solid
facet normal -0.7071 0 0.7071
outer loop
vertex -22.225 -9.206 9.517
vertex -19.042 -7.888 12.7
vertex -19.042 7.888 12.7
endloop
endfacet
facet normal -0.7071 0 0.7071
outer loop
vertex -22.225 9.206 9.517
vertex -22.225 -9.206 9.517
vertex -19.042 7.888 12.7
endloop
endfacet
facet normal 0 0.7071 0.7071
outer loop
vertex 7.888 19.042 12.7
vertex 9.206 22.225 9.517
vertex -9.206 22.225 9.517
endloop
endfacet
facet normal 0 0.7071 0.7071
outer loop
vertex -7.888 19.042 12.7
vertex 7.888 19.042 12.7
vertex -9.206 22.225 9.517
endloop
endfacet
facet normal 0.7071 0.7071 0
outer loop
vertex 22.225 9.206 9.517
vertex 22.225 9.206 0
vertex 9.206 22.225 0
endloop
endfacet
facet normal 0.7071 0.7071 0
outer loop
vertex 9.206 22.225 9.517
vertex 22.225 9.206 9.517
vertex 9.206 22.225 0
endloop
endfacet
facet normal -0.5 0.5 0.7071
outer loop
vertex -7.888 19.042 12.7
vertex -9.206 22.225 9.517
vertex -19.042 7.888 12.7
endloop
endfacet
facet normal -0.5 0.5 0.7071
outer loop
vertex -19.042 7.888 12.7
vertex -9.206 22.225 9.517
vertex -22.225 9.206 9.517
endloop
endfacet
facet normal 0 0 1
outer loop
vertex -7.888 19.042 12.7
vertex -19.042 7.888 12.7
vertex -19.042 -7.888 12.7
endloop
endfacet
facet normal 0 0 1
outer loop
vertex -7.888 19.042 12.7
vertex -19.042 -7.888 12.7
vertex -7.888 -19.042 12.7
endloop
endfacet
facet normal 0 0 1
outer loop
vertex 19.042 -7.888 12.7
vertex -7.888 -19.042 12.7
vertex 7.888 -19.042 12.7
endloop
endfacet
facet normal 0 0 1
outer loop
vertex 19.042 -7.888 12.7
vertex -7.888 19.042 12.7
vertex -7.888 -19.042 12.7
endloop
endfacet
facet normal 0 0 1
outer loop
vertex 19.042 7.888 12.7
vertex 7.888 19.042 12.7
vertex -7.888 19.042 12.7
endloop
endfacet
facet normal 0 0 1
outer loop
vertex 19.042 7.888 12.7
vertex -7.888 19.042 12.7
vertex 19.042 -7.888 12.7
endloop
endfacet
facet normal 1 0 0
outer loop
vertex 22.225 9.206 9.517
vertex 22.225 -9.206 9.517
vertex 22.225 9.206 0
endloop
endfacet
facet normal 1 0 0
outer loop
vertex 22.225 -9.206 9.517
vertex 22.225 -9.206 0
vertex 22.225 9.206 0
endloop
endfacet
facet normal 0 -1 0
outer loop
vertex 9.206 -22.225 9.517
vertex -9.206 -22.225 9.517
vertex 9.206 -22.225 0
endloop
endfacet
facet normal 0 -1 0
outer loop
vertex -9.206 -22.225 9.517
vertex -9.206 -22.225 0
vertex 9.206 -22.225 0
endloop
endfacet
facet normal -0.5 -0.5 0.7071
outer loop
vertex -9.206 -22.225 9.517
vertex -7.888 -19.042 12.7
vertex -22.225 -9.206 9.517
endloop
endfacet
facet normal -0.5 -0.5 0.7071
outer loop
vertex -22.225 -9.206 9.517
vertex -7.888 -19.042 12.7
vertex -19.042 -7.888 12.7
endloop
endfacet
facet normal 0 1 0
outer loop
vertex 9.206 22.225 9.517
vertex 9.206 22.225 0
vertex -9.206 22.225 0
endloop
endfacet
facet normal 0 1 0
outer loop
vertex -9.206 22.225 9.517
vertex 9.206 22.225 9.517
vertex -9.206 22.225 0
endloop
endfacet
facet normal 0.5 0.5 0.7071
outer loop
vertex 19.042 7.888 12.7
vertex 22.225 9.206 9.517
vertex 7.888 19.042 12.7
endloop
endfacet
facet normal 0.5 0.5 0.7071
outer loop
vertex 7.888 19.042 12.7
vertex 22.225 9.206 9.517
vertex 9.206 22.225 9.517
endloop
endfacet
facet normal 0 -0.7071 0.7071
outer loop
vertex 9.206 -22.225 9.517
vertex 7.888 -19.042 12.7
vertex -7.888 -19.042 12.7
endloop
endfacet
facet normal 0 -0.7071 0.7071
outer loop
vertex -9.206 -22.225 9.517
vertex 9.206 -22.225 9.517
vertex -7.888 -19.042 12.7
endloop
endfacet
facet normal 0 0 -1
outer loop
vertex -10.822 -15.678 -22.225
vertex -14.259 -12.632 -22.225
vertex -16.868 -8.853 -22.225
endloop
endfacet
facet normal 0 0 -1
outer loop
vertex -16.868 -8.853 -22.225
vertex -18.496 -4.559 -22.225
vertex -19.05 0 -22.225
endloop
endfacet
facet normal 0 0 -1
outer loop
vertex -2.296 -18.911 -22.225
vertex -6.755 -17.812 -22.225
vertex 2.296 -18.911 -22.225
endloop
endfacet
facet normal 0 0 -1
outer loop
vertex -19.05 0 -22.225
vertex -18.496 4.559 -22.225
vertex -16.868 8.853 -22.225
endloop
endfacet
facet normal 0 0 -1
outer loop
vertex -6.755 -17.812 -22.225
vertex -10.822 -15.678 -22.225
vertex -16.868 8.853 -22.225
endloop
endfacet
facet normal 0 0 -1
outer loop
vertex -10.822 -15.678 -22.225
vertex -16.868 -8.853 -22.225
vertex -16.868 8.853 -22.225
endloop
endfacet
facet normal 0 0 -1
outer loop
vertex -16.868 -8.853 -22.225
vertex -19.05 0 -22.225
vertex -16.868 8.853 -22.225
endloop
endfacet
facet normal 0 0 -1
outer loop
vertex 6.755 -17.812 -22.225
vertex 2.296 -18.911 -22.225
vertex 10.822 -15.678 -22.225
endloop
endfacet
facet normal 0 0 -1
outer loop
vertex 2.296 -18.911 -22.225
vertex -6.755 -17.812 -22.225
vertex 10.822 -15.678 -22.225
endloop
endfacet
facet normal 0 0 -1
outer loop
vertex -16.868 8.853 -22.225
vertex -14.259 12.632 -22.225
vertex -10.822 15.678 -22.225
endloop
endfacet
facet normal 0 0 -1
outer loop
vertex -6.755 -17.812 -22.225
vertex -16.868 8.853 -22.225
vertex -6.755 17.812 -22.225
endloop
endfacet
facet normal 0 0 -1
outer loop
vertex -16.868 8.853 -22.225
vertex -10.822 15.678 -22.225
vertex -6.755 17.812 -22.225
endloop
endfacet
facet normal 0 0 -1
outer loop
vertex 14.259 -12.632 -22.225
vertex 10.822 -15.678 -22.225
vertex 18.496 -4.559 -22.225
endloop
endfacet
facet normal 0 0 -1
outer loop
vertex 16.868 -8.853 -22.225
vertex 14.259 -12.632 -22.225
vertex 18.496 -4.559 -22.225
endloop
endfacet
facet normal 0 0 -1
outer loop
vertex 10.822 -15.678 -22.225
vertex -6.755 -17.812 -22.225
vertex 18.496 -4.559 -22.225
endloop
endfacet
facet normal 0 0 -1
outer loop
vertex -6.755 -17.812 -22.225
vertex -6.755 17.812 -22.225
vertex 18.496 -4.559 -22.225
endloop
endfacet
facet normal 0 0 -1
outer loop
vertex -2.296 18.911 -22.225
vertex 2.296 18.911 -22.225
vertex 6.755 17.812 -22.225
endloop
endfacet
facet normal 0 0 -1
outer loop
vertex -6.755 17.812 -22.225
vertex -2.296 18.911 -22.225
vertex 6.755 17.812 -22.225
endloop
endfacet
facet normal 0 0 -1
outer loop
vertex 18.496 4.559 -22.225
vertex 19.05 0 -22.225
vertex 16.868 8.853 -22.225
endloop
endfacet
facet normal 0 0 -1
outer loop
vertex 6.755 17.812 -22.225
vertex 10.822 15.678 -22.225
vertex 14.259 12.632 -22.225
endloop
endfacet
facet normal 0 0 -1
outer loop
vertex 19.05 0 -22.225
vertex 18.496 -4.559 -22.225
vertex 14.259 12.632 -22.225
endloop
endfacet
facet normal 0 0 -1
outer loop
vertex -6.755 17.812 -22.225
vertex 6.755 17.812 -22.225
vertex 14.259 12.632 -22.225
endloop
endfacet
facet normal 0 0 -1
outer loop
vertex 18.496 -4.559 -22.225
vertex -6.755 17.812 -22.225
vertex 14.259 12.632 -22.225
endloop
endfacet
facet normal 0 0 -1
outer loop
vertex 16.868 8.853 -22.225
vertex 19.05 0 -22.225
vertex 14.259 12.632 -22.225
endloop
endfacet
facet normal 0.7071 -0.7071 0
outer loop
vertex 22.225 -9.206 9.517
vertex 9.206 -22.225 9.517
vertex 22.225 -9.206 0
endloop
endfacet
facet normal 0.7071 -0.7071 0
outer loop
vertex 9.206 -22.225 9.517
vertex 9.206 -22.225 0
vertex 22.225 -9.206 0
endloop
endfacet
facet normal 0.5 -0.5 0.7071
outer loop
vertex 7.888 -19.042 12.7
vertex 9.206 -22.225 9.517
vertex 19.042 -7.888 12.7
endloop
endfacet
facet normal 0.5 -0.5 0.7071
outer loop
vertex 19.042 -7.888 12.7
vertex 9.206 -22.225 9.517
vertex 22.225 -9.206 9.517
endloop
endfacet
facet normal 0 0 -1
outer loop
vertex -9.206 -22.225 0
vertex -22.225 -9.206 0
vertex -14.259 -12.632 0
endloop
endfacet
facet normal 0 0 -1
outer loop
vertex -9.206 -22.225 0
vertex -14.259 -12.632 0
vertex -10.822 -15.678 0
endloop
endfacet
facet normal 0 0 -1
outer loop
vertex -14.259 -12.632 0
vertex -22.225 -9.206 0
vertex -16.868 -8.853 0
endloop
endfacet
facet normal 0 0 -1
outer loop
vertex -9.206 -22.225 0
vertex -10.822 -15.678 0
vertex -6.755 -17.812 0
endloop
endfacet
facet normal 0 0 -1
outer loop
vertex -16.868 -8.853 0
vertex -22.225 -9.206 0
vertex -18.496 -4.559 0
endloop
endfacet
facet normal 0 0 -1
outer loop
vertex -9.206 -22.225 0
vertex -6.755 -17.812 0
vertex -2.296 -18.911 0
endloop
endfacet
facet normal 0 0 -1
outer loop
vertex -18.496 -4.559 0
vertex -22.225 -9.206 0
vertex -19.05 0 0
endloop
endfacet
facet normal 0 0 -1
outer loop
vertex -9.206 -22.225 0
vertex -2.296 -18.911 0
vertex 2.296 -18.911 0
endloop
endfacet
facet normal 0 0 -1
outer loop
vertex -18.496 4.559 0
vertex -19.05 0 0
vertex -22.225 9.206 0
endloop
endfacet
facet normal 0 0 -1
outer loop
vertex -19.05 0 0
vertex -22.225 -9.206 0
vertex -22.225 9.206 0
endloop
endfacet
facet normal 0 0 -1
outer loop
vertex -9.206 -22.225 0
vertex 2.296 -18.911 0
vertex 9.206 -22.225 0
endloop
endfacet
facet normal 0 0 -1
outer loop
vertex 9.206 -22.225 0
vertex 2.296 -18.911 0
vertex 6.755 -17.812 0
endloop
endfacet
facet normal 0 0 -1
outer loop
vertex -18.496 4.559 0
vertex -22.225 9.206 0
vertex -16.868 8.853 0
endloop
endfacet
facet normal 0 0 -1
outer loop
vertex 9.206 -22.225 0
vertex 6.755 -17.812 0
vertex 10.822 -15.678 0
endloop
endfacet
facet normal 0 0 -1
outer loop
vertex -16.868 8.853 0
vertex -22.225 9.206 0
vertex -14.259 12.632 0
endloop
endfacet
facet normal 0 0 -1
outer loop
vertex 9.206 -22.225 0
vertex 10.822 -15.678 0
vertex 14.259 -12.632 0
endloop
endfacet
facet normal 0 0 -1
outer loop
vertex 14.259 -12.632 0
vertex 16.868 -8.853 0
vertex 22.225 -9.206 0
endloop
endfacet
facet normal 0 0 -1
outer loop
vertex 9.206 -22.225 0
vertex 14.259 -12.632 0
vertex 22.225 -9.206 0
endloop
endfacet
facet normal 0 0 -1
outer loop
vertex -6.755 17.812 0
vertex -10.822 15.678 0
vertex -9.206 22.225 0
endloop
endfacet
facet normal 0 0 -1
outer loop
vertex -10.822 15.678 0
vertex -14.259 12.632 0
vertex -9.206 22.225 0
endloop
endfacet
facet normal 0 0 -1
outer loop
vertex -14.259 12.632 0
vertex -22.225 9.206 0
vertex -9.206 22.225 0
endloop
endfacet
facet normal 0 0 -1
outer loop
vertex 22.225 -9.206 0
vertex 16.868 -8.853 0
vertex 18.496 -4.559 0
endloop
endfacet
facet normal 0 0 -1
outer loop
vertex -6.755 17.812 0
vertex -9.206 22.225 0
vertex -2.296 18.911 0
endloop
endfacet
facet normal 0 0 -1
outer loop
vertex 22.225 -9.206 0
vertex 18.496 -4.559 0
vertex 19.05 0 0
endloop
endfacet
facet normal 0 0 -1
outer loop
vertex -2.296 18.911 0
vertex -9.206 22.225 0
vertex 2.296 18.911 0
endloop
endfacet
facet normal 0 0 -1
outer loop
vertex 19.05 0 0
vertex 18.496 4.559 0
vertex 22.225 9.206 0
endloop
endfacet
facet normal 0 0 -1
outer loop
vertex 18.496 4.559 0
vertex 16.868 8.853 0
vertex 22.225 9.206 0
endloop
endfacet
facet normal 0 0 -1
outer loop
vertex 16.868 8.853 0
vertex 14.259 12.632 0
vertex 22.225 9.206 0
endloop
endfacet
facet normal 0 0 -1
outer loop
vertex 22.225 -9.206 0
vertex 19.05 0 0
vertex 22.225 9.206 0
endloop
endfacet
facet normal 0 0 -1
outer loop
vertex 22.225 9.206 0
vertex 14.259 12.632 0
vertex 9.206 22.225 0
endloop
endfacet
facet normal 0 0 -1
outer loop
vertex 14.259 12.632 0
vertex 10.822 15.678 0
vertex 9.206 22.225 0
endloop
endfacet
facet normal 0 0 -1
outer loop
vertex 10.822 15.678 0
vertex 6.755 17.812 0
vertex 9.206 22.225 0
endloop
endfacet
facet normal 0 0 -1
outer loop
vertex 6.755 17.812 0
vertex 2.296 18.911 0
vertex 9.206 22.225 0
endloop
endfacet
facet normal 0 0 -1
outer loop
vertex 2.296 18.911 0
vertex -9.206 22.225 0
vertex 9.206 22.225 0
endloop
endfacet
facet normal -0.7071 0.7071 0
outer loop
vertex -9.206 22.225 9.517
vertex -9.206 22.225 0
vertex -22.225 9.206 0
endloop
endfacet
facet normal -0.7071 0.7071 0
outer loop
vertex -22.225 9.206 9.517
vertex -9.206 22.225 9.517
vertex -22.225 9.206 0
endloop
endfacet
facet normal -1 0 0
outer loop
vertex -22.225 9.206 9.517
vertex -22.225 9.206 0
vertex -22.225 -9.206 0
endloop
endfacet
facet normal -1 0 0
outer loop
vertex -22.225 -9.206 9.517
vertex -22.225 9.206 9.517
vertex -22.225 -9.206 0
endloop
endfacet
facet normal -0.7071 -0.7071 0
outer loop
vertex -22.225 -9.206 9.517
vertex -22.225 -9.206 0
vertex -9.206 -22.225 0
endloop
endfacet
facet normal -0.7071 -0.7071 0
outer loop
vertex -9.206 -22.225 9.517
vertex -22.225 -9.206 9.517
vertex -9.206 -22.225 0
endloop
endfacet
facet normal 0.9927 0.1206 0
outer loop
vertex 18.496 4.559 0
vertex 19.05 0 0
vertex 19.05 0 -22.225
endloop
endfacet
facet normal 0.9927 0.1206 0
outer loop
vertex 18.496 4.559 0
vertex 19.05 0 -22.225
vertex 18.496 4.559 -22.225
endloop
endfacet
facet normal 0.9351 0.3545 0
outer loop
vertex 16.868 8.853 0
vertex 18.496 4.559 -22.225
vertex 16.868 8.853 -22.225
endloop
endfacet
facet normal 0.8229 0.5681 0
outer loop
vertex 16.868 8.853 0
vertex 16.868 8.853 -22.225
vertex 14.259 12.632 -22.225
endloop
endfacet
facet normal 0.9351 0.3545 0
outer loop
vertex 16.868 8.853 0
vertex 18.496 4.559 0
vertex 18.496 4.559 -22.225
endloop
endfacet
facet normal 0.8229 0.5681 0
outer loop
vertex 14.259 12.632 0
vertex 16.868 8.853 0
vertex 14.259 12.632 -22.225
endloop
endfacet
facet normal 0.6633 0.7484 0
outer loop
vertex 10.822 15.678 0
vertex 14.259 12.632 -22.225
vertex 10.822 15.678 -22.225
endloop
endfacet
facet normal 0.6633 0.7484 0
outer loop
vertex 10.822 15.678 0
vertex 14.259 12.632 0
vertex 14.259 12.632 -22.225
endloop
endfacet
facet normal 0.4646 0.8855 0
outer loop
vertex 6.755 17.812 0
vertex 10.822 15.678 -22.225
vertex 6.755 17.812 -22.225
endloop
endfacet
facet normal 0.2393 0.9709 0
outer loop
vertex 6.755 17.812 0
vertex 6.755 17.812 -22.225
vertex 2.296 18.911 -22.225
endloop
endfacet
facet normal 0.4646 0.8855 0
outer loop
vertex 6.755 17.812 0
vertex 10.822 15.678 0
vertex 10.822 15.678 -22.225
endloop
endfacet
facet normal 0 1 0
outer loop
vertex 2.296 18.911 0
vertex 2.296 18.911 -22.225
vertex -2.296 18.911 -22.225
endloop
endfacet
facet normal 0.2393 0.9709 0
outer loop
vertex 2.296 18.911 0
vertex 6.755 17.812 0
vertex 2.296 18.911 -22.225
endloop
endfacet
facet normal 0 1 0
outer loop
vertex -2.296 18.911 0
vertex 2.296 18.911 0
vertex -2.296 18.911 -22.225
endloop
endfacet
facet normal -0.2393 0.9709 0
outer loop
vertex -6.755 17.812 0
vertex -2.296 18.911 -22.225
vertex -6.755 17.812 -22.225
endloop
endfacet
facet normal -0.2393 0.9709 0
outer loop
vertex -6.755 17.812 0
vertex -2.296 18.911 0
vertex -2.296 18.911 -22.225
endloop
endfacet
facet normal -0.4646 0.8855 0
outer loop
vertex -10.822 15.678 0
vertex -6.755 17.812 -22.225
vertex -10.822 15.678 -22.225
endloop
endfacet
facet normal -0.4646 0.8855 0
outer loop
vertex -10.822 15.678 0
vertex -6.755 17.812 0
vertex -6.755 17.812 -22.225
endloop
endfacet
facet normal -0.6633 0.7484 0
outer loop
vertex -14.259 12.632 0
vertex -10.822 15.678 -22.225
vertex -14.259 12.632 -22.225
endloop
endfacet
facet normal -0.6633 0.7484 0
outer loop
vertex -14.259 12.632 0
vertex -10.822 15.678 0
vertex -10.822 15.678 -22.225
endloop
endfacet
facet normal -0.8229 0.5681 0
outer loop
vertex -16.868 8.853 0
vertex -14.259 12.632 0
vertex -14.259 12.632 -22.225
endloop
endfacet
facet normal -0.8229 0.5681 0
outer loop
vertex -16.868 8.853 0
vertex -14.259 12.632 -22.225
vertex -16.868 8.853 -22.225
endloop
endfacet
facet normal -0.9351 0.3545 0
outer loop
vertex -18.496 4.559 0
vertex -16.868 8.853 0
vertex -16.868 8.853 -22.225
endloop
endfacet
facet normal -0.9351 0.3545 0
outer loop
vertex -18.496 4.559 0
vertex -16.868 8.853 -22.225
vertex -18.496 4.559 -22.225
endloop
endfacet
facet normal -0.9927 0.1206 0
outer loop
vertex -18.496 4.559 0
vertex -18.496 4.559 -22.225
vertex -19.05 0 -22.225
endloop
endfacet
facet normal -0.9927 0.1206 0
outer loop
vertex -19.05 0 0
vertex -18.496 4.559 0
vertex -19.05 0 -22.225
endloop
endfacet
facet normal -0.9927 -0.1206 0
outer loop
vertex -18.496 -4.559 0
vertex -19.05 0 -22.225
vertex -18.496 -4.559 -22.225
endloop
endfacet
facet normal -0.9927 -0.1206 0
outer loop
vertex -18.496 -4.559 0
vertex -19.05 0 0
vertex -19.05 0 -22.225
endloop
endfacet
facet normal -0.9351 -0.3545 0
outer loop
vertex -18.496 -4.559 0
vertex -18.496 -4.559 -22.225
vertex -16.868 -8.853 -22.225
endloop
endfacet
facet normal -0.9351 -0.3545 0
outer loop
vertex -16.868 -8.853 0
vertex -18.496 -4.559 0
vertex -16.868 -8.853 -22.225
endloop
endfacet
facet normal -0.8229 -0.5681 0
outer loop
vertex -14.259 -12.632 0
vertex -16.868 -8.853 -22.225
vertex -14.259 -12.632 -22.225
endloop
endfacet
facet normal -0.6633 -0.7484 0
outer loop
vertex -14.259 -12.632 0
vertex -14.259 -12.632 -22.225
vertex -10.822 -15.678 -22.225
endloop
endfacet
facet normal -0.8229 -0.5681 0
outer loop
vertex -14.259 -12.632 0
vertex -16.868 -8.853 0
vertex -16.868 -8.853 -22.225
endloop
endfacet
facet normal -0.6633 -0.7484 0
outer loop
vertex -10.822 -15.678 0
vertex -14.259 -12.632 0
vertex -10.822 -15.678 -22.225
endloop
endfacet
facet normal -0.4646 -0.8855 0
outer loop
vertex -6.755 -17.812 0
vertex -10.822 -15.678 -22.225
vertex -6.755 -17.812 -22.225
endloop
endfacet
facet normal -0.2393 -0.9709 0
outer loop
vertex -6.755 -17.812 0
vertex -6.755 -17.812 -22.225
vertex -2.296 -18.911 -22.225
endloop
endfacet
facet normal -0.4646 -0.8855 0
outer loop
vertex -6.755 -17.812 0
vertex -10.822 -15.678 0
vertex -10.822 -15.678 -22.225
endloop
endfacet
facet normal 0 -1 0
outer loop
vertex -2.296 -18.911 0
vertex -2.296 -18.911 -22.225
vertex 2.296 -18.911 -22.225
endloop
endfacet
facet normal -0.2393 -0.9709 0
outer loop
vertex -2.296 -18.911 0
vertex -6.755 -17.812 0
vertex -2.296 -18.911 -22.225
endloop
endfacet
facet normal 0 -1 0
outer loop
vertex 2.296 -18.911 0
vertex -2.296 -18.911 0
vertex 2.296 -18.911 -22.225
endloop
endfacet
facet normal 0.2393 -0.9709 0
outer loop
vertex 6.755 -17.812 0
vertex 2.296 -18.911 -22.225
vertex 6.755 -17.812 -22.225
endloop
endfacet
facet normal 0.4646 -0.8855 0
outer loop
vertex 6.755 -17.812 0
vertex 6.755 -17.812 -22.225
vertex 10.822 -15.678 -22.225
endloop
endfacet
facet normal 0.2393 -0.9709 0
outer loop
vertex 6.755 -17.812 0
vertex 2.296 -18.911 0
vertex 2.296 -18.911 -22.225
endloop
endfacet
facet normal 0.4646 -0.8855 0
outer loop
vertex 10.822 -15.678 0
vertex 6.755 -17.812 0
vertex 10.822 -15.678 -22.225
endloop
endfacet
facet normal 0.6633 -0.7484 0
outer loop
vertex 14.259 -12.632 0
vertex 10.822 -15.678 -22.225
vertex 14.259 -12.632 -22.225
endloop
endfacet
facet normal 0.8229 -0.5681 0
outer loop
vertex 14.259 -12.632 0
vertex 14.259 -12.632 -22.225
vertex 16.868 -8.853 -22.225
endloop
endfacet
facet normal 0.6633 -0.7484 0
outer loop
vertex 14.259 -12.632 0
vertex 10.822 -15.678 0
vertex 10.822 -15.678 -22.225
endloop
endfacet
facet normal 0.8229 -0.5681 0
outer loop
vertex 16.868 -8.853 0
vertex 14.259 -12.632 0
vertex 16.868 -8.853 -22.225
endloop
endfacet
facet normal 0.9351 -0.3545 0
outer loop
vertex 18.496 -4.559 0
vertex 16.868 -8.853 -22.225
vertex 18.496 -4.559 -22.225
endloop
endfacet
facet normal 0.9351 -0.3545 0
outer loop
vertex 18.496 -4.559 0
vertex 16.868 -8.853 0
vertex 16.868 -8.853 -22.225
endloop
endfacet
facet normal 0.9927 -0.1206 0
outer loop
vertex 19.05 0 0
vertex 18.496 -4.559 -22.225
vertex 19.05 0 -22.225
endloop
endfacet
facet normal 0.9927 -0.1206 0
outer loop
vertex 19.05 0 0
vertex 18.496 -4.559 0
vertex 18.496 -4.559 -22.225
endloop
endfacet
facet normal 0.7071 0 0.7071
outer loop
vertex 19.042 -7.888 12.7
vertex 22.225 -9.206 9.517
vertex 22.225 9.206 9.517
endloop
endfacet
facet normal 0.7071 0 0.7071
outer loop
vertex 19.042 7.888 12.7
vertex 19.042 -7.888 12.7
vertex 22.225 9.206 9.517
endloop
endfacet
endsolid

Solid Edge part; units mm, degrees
sketch "Sketch1" plane through (0, 0, 0) normal (0, 0, 1) x (1, 0, 0)
  circle A0 centre (0, 0) radius 19.05
extrude "Protrusion1" add sketch "Sketch1" against normal blind 22.225
sketch "Sketch2" plane through (0, 0, 0) normal (0, 0, 1) x (1, 0, 0)
  line L0 (-22.225, -9.2059) -> (-9.2059, -22.225)
  line L1 (-9.2059, -22.225) -> (9.2059, -22.225)
  line L2 (9.2059, -22.225) -> (22.225, -9.2059)
  line L3 (22.225, -9.2059) -> (22.225, 9.2059)
  line L4 (22.225, 9.2059) -> (9.2059, 22.225)
  line L5 (9.2059, 22.225) -> (-9.2059, 22.225)
  line L6 (-9.2059, 22.225) -> (-22.225, 9.2059)
  line L7 (-22.225, 9.2059) -> (-22.225, -9.2059)
extrude "ExtrudedProtrusion_2" add sketch "Sketch2" along normal blind 12.7
chamfer "Chamfer_1" distance 3.1826 angle 45 8 edges at (15.7154, -15.7154, 12.7) (22.225, 0, 12.7) (15.7154, 15.7154, 12.7) (0, 22.225, 12.7) (-15.7154, 15.7154, 12.7) (-22.225, 0, 12.7) (-15.7154, -15.7154, 12.7) (0, -22.225, 12.7)
